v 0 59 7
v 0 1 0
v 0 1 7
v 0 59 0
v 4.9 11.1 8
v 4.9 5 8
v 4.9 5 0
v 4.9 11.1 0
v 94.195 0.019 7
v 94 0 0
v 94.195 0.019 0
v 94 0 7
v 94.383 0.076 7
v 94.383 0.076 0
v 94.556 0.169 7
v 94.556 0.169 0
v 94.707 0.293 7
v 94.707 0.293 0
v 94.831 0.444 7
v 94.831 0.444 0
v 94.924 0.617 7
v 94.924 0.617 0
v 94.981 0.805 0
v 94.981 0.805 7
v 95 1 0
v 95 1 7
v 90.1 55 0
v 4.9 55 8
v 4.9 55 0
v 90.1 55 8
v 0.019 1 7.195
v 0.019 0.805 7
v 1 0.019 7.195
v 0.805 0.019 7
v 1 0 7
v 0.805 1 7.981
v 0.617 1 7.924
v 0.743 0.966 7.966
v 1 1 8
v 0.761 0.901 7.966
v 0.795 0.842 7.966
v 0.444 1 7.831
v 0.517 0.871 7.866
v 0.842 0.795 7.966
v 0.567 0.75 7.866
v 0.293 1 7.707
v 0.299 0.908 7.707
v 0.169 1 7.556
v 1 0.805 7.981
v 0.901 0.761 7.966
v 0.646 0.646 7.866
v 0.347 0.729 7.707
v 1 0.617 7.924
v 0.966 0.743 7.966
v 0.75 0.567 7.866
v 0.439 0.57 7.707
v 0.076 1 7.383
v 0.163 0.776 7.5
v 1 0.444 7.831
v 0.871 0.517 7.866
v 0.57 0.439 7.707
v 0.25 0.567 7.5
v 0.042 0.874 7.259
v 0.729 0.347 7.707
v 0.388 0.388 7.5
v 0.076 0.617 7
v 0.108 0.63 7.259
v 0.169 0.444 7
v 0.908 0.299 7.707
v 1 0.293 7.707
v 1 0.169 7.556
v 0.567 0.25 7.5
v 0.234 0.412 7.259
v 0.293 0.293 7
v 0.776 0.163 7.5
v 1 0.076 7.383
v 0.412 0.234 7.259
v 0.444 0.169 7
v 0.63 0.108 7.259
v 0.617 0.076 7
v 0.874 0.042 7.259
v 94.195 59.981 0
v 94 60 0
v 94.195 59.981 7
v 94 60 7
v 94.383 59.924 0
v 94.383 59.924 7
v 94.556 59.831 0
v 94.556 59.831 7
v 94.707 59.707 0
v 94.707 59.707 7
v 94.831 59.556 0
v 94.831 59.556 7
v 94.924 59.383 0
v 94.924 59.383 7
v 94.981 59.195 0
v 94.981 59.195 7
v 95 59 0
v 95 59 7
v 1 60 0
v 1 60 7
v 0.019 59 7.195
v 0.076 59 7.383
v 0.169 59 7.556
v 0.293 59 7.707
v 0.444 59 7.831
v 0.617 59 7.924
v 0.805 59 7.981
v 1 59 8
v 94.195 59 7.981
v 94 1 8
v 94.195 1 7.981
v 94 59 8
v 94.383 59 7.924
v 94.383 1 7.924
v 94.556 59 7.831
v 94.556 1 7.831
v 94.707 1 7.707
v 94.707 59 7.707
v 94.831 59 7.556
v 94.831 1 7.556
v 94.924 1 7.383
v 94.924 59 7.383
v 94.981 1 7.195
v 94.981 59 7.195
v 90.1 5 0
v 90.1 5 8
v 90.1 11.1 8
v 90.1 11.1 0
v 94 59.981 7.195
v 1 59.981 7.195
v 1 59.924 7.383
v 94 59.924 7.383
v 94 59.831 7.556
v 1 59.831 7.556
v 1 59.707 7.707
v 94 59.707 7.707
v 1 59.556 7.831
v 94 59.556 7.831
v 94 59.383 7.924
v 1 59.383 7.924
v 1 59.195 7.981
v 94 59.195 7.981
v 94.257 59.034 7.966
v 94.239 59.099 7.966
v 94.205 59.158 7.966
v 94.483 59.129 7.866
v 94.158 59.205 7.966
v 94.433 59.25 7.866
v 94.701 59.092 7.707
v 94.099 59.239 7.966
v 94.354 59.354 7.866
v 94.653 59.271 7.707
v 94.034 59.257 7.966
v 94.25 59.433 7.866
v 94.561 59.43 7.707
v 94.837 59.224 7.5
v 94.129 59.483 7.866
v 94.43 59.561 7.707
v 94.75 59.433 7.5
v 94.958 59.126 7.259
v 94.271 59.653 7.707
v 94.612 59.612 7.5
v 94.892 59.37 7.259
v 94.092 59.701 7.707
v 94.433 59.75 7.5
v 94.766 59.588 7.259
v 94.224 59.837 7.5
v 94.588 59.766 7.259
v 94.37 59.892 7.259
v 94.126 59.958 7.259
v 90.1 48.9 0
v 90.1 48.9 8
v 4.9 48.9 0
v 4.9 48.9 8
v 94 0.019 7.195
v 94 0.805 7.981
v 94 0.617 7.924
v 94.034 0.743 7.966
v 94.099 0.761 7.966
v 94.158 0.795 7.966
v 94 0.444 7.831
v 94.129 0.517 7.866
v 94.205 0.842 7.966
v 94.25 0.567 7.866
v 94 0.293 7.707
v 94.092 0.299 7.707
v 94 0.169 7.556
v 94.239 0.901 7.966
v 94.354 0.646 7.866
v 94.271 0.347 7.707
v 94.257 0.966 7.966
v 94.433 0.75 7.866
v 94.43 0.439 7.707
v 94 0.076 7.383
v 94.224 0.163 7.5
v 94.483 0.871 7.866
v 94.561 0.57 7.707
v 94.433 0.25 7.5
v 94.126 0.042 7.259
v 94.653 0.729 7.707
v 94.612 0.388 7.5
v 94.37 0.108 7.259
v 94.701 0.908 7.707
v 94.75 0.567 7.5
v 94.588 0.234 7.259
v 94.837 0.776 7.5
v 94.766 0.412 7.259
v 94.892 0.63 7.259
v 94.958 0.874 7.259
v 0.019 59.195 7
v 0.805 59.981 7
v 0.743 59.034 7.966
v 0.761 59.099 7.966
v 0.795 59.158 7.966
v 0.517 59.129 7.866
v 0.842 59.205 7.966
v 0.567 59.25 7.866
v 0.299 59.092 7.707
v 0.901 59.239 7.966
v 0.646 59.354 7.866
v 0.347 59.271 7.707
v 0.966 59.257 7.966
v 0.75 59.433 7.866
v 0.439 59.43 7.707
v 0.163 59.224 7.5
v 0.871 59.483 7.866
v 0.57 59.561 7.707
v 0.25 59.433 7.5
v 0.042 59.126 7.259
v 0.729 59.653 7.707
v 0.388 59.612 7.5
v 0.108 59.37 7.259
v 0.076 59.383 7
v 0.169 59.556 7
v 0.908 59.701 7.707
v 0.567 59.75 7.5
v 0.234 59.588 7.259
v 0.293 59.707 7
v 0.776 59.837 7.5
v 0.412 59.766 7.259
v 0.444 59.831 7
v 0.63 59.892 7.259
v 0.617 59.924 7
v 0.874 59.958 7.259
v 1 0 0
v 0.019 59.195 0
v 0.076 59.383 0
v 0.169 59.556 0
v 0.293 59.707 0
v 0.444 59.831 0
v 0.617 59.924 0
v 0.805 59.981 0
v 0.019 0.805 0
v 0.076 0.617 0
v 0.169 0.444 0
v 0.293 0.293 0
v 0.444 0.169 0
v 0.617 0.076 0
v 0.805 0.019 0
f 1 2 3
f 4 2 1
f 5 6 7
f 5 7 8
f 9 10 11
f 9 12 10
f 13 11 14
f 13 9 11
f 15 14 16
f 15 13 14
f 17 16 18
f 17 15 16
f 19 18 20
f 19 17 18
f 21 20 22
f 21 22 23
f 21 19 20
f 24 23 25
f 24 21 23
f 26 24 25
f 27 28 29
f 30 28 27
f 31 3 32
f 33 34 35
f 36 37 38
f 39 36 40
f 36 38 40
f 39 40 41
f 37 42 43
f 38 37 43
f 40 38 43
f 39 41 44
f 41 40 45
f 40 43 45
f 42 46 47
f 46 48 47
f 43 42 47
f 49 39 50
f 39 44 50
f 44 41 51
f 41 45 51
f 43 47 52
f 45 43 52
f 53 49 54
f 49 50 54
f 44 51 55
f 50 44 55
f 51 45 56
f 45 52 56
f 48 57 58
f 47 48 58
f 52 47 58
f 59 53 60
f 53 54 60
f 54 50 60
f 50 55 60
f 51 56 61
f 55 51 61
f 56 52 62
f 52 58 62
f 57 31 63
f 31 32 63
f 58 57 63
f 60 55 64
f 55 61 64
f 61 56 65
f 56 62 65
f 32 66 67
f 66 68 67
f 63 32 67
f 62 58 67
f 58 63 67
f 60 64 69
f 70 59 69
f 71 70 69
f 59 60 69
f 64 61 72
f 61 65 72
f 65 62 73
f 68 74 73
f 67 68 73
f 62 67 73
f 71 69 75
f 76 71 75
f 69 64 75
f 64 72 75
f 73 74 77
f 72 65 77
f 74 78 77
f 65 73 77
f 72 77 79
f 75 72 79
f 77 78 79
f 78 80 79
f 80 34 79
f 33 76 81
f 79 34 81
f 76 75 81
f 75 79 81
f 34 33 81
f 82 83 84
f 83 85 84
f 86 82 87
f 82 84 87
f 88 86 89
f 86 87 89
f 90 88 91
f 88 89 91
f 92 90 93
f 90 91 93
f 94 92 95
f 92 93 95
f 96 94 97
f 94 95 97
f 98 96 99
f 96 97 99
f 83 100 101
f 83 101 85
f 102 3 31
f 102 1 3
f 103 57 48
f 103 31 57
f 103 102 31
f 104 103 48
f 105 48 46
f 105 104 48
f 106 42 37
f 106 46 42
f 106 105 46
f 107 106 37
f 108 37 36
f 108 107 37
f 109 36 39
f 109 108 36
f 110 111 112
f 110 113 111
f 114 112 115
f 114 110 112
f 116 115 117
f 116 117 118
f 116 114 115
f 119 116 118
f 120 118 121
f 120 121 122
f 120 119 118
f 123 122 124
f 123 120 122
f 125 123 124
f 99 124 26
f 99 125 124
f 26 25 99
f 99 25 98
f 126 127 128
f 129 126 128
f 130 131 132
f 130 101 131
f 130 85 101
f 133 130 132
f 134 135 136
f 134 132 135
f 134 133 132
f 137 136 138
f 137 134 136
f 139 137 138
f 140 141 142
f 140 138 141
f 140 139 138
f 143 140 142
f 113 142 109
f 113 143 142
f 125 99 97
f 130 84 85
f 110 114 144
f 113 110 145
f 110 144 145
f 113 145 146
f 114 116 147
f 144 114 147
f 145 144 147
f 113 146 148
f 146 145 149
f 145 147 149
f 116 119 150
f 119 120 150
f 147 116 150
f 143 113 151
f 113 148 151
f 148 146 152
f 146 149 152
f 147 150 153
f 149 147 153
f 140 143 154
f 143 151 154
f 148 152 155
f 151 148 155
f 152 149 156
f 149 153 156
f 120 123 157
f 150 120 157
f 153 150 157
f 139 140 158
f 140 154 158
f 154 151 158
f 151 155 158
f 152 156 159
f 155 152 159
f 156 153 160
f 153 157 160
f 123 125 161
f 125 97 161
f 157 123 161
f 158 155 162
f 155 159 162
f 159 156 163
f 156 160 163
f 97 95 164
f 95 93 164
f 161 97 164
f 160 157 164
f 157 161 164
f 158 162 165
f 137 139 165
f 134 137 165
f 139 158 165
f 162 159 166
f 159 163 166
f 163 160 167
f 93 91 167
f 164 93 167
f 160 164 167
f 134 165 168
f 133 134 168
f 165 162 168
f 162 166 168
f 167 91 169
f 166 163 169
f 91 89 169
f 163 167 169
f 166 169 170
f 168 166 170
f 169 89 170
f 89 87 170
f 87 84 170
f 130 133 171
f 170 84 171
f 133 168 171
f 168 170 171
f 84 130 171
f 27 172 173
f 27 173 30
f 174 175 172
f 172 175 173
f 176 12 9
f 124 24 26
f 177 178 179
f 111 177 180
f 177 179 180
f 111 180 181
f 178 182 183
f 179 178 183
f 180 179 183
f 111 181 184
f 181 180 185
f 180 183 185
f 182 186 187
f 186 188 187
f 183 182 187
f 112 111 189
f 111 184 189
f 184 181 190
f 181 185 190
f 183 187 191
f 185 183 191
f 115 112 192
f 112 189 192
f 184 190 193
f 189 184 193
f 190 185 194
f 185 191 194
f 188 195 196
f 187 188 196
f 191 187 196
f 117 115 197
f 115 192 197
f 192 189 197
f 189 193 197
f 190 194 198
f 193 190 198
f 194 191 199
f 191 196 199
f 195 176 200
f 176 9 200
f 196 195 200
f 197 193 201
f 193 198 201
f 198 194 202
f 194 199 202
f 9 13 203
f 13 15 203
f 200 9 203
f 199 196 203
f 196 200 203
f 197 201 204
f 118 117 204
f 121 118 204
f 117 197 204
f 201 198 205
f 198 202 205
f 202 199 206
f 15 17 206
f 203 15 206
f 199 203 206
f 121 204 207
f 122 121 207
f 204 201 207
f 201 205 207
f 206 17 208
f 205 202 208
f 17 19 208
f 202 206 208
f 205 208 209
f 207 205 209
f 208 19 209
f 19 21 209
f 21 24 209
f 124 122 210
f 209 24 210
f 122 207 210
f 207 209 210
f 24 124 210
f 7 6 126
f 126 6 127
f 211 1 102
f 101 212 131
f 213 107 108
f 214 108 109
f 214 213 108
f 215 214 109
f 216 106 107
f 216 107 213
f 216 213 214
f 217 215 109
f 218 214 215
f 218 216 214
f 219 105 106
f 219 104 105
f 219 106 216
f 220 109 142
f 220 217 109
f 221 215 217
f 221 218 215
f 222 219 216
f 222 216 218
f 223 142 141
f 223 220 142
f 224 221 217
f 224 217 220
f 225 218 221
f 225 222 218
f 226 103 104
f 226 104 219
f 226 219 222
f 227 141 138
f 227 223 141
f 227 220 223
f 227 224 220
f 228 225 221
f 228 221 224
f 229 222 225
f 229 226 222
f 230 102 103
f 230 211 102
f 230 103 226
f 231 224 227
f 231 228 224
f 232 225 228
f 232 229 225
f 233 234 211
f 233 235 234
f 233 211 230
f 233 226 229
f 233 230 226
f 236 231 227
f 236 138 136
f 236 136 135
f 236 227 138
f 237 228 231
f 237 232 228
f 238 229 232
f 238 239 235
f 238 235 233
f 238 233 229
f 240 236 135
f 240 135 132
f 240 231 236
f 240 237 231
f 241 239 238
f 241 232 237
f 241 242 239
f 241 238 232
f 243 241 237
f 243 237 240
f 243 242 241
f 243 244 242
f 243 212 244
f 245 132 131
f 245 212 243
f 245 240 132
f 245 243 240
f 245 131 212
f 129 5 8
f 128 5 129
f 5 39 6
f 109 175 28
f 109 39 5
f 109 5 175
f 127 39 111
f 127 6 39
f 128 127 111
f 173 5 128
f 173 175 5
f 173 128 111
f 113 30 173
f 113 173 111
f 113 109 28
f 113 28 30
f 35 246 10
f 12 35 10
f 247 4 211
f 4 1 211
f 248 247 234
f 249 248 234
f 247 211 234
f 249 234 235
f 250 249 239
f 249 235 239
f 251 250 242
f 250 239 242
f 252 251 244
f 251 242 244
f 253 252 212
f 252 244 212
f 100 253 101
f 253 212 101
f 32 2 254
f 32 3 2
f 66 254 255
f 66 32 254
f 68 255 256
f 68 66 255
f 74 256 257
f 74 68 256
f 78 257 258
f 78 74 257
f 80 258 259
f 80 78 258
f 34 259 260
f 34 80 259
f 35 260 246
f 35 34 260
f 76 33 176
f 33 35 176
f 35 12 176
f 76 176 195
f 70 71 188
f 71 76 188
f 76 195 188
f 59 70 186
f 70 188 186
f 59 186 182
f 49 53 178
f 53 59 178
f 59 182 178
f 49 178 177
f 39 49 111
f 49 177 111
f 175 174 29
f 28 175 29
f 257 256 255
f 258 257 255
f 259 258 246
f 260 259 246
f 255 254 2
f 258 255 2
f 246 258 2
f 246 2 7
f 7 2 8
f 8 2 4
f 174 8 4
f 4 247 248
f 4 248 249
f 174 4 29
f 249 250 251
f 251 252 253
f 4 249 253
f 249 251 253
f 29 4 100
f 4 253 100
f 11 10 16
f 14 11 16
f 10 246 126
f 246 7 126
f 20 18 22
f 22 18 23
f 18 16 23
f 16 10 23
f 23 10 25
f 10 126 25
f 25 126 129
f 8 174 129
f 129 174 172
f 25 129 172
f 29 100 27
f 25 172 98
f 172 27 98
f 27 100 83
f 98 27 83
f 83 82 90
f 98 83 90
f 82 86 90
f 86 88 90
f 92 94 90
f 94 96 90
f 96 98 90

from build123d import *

# Parameters (mm, degrees)
F0_W     = 95
F0_H     = 60
F1_DEPTH = 8
F2_W     = 85.2
F2_H     = 6.1
F3_DEPTH = 25
F4_R     = 1


with BuildPart() as f1:
    # F0 (on Top) → F1 (new body)
    with BuildSketch(Plane.XY):
        with Locations((47.5, 30)):
            Rectangle(F0_W, F0_H)
    extrude(amount=F1_DEPTH)

    # F2 (on face) → F3 (cut)
    with BuildSketch(Plane.XY.offset(8)):
        with Locations((47.5, 51.95)):
            Rectangle(F2_W, F2_H)
        with Locations((47.5, 8.05)):
            Rectangle(F2_W, F2_H)
    extrude(amount=-F3_DEPTH, mode=Mode.SUBTRACT)

    # F4
    f4_edges = [f1.edges().sort_by_distance(p)[0] for p in [
        (0, 60, 4),
        (0, 0, 4),
        (95, 0, 4),
        (95, 60, 4),
        (0, 30, 8),
        (47.5, 0, 8),
        (95, 30, 8),
        (47.5, 60, 8),
    ]]
    fillet(f4_edges, radius=F4_R)


solid = f1.part
